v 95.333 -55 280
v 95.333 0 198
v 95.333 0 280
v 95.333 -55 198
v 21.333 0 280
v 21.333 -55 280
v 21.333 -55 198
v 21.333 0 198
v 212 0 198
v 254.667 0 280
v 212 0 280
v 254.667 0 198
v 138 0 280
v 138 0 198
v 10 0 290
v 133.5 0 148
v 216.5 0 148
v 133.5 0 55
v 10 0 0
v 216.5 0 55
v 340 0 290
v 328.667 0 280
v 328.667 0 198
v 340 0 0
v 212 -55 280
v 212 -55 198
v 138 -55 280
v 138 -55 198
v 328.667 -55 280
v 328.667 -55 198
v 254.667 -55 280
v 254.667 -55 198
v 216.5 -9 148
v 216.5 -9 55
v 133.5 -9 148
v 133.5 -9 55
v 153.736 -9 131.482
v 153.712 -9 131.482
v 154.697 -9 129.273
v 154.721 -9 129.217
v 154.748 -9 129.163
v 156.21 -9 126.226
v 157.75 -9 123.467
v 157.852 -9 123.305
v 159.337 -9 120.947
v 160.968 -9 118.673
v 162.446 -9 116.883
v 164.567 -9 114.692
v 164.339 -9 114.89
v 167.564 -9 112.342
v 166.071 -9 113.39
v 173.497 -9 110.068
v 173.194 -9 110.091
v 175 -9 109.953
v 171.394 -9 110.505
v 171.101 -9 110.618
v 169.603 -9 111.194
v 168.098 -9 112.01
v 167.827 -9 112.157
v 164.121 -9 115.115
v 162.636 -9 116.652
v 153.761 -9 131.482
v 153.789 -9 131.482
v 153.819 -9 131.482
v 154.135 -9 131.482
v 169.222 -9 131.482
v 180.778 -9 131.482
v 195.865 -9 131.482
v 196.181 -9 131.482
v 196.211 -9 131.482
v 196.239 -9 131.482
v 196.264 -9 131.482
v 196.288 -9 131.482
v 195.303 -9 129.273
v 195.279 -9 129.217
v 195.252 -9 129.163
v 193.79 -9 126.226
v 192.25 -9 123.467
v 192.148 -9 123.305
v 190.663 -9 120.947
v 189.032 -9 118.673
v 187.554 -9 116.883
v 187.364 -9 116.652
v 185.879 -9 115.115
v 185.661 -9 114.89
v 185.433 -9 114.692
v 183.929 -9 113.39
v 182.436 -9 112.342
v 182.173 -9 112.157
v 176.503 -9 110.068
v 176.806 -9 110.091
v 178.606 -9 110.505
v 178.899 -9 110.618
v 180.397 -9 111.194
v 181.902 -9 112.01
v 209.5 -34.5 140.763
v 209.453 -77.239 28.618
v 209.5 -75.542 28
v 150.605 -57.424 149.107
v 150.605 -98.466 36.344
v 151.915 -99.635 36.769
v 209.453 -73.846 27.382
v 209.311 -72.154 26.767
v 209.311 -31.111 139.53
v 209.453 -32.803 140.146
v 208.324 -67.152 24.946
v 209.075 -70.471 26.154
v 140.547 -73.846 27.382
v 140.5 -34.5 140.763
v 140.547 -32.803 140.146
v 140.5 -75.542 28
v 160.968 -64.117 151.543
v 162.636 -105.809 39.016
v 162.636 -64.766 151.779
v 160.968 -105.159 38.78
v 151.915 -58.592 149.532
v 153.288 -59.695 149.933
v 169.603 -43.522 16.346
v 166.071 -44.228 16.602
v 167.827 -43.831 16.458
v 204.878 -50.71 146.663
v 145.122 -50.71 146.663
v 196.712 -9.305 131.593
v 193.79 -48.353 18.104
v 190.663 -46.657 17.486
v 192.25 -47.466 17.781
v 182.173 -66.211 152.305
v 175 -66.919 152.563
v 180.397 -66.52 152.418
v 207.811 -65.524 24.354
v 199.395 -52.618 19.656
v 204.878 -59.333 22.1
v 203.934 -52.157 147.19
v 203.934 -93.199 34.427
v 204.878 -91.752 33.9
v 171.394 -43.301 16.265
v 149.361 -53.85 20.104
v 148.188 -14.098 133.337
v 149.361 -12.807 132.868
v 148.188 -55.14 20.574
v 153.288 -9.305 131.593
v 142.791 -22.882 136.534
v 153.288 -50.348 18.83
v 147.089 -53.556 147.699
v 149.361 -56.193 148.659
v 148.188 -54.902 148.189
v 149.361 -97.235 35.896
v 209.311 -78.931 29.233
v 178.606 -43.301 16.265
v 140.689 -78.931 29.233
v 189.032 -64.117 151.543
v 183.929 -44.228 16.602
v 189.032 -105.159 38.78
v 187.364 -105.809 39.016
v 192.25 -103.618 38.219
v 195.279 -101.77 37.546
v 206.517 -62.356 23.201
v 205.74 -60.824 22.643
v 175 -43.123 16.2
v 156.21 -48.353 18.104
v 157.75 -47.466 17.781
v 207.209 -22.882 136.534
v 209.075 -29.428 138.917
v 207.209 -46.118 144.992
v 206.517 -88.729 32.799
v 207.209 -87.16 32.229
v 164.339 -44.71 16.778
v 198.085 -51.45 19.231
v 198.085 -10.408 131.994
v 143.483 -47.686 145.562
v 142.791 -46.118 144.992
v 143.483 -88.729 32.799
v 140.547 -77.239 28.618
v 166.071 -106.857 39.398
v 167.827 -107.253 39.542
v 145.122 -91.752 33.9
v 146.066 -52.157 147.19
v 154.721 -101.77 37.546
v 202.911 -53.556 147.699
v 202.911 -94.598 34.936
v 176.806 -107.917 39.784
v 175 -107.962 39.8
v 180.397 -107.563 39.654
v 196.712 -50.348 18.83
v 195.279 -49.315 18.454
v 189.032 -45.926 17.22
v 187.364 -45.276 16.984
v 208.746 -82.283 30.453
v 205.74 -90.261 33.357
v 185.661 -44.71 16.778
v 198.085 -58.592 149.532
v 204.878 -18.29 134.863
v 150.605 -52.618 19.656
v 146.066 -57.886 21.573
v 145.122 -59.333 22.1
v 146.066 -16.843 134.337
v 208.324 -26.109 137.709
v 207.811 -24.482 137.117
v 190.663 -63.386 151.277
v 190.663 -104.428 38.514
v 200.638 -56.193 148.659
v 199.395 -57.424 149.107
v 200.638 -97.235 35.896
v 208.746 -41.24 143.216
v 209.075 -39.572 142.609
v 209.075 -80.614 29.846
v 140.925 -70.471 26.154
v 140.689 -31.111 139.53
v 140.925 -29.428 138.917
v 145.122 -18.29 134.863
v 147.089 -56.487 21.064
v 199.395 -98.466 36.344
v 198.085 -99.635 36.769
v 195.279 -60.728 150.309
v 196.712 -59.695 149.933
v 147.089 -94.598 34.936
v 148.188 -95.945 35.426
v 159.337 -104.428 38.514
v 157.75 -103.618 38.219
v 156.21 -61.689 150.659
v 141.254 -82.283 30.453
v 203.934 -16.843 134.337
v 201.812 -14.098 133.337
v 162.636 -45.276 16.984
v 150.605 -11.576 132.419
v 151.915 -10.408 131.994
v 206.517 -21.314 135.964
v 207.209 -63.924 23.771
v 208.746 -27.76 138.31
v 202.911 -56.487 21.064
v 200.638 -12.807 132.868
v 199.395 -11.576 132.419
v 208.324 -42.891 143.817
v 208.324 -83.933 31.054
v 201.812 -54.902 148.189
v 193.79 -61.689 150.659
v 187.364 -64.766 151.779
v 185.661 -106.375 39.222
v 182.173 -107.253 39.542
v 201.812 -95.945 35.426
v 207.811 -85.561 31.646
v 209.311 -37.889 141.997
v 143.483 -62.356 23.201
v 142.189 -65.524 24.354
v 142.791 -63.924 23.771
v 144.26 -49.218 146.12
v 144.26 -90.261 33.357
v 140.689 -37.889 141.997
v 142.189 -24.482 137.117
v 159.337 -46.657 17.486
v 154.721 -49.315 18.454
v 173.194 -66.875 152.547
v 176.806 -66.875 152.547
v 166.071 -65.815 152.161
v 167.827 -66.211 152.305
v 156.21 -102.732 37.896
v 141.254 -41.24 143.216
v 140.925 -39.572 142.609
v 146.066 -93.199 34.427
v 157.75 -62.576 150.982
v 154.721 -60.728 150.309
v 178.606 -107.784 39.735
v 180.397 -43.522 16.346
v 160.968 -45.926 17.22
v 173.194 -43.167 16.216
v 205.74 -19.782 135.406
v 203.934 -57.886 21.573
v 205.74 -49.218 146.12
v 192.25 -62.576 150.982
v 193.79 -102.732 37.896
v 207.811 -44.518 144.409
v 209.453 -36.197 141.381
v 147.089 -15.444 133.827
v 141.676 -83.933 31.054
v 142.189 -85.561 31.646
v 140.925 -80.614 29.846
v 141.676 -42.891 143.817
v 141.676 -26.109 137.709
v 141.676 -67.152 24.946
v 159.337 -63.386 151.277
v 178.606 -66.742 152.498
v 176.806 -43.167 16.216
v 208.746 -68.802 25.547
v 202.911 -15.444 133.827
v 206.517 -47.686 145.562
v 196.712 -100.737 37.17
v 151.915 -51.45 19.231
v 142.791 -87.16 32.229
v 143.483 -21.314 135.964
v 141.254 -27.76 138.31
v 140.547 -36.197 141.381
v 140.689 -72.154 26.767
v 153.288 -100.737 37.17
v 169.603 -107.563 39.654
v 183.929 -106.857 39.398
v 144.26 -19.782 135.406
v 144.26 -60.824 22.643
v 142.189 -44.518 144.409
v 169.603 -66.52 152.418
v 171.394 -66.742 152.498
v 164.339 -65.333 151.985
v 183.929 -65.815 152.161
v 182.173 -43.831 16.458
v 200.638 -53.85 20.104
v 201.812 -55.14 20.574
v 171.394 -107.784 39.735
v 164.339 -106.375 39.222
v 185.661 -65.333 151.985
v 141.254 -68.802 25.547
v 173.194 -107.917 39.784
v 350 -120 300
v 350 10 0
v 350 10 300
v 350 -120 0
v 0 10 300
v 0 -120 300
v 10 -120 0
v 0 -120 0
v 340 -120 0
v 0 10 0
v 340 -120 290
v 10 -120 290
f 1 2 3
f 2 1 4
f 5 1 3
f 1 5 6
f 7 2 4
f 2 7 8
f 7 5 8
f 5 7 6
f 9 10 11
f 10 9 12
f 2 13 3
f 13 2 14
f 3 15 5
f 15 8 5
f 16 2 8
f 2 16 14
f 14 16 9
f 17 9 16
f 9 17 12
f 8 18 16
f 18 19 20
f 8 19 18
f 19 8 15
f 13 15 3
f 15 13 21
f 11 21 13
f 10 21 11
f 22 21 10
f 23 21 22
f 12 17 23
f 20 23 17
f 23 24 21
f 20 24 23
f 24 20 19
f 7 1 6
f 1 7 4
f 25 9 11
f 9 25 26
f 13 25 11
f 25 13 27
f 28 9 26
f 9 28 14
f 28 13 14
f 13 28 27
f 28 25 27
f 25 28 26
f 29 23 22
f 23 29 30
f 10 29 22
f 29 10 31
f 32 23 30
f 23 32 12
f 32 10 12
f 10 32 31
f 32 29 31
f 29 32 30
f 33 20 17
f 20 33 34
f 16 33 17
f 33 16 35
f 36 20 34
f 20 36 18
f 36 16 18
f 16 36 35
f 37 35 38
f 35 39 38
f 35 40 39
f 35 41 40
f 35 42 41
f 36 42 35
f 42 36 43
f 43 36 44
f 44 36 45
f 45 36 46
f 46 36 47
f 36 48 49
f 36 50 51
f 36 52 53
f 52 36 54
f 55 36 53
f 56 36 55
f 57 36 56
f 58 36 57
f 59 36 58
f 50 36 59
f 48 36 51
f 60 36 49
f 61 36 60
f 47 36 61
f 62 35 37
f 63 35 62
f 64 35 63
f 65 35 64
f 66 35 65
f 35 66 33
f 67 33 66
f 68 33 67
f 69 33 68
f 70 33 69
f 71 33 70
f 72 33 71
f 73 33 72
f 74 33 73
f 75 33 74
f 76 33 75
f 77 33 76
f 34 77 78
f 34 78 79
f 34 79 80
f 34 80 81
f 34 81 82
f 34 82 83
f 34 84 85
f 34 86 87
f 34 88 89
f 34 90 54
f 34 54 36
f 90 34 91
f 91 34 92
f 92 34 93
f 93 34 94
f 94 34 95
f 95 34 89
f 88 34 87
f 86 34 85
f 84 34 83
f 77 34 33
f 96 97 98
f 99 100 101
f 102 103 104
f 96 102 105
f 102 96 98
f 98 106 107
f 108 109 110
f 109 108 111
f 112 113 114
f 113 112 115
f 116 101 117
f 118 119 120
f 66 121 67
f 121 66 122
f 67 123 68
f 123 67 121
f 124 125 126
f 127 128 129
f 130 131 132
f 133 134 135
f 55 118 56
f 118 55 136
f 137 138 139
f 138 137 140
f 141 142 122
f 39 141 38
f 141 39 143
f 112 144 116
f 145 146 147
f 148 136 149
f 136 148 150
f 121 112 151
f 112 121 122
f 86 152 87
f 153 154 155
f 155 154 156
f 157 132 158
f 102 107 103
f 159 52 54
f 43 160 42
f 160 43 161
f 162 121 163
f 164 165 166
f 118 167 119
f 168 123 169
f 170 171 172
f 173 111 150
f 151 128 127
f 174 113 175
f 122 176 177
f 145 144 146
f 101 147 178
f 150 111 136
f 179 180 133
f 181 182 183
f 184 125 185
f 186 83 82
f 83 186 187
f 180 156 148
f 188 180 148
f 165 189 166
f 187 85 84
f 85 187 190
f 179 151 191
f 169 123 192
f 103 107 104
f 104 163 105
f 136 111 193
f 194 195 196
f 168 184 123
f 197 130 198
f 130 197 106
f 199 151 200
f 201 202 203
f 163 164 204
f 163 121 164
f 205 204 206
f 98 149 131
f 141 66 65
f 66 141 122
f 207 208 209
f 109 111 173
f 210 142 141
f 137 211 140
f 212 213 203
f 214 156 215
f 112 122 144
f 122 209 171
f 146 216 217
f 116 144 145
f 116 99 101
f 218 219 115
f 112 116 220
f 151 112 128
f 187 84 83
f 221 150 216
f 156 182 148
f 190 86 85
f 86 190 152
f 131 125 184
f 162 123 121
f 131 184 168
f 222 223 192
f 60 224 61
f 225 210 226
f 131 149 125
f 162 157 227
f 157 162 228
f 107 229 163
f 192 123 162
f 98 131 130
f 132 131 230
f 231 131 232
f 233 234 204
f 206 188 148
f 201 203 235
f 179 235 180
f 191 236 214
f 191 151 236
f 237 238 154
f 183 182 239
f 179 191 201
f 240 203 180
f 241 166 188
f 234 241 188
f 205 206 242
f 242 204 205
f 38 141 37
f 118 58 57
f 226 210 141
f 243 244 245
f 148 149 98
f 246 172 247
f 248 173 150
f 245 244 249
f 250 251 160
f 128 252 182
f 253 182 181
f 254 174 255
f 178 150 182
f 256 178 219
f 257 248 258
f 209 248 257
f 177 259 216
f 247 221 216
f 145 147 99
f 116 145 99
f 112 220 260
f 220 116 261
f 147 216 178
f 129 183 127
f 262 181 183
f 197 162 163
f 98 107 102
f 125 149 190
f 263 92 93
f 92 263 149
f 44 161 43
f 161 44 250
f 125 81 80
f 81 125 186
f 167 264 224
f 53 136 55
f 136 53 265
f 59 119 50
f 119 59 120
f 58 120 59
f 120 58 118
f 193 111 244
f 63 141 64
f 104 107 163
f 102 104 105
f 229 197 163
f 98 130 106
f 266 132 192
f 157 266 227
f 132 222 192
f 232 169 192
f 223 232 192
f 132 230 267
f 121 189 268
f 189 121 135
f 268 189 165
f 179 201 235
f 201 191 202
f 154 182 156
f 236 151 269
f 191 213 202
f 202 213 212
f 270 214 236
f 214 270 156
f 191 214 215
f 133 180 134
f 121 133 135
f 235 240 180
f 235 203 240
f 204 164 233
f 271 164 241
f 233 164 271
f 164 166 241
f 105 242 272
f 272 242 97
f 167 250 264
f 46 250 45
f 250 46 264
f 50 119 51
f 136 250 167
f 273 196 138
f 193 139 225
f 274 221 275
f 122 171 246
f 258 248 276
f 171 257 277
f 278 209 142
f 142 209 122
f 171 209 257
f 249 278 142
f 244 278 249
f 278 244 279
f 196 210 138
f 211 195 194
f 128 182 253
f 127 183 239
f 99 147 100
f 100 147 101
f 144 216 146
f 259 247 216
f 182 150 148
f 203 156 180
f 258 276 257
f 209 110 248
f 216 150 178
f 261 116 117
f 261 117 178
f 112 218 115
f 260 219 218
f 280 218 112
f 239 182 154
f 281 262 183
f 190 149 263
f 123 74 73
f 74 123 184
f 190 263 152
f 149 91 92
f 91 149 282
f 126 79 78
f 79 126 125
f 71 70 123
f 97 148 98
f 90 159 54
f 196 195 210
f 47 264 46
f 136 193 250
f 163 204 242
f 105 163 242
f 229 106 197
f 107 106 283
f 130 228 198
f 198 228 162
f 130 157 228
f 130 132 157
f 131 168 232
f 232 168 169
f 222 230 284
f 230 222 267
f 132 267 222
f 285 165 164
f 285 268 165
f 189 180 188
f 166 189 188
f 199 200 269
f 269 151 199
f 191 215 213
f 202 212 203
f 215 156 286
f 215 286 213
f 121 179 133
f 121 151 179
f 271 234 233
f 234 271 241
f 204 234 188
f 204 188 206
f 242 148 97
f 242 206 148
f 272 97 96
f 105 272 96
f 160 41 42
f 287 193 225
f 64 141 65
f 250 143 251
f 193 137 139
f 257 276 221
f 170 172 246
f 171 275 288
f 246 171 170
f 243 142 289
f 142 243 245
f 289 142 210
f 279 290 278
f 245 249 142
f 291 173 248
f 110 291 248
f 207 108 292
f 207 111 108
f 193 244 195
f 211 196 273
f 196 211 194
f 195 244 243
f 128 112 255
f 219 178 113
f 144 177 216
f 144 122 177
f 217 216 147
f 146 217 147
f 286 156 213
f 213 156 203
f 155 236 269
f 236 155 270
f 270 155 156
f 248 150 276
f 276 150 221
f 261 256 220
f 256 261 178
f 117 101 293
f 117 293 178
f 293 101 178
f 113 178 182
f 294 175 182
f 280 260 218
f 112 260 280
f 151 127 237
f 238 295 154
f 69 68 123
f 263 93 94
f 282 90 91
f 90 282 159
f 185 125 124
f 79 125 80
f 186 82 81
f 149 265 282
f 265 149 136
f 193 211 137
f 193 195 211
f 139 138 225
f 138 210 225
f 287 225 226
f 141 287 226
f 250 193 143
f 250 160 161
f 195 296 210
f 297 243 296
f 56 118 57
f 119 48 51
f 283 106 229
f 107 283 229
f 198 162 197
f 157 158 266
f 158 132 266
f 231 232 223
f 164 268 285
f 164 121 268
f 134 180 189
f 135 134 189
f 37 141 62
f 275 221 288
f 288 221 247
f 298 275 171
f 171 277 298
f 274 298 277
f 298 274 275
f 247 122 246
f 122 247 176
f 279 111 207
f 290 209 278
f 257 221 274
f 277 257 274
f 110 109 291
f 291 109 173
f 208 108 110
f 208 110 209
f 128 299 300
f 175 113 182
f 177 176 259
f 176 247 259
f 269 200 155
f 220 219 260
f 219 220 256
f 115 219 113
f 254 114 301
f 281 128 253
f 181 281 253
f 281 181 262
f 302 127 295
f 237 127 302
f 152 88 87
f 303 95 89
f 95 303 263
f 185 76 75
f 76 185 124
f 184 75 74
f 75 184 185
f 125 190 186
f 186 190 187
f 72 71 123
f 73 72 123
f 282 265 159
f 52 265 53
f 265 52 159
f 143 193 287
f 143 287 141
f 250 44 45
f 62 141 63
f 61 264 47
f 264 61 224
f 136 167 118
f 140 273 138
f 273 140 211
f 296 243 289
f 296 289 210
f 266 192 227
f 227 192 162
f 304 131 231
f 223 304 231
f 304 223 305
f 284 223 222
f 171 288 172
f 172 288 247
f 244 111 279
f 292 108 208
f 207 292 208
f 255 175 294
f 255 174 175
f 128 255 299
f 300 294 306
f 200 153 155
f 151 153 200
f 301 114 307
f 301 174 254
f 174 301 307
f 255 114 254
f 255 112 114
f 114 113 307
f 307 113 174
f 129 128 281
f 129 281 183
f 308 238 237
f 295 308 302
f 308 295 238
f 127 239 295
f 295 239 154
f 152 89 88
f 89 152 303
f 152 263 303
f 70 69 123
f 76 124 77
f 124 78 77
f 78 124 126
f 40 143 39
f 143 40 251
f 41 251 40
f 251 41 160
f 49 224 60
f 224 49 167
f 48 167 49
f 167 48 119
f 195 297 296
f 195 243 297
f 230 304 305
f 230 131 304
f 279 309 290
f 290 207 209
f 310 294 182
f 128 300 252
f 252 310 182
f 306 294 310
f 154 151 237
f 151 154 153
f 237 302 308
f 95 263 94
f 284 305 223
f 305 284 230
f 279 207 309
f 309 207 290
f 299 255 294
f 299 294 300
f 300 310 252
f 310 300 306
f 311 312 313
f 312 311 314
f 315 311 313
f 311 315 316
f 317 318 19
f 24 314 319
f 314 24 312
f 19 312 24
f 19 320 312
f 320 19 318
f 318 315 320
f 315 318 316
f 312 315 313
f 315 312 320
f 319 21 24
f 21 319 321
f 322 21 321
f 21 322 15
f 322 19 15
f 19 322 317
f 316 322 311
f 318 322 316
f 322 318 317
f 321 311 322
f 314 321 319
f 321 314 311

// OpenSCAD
$fn = 120;

woodThickness = 10;
plateSize = [350, woodThickness, 300];
boxDepth = 120;

schukoMargin = 20;
schukoSize = [74, 55, 82];

ceeRed16Margin = 50;
ceeRed16Base = [83, 9, 93];
ceeRed16Angle = 20;
ceeRed16Diameter = 69;
ceeRed16Length = 120; // 131

module echoedCube(name, size)
{
	cube(size);
	echo(name, [for (i = size) if(i != woodThickness) i]);
};

module schuko()
{
	translate([0, -schukoSize[1], -schukoSize[2]])
		cube(schukoSize);
};

module ceeRed16()
{
	translate([0, -ceeRed16Base[1], -ceeRed16Base[2]])
		cube(ceeRed16Base);

	rotYOffset = sin(ceeRed16Angle) * ceeRed16Length;
	translate([
			ceeRed16Base[0] / 2,
			-ceeRed16Diameter / 2 - rotYOffset,
			-ceeRed16Length
		])
		rotate([-ceeRed16Angle, 0, 0])
		cylinder(h=ceeRed16Length, d=ceeRed16Diameter);
}

//backplate
echoedCube("backplate", plateSize);

//front plate
translate([0, -boxDepth - woodThickness, 0])
	%echoedCube("fontplate", plateSize);

//top plate
translate([woodThickness, -boxDepth, plateSize[2] - woodThickness])
	echoedCube("top plate", [
		plateSize[0] - 2 * woodThickness,
		boxDepth,
		woodThickness
	]);

//side plates
translate([0, -boxDepth, 0])
	echoedCube("side plate", [woodThickness, boxDepth, plateSize[2]]);
translate([plateSize[0] - woodThickness, -boxDepth, 0])
	echoedCube("side plate", [woodThickness, boxDepth, plateSize[2]]);

// schukos
for(i = [0:2])
{
	posX = (i + 0.5) * plateSize[0] / 3 - schukoSize[0] / 2;
	translate([posX, 0, plateSize[2] - schukoMargin])
		schuko();
}

// cee red
translate([
		plateSize[0] / 2 - ceeRed16Base[0] / 2,
		0,
		plateSize[2] - schukoMargin - ceeRed16Margin - schukoSize[2]
	])
	ceeRed16();
